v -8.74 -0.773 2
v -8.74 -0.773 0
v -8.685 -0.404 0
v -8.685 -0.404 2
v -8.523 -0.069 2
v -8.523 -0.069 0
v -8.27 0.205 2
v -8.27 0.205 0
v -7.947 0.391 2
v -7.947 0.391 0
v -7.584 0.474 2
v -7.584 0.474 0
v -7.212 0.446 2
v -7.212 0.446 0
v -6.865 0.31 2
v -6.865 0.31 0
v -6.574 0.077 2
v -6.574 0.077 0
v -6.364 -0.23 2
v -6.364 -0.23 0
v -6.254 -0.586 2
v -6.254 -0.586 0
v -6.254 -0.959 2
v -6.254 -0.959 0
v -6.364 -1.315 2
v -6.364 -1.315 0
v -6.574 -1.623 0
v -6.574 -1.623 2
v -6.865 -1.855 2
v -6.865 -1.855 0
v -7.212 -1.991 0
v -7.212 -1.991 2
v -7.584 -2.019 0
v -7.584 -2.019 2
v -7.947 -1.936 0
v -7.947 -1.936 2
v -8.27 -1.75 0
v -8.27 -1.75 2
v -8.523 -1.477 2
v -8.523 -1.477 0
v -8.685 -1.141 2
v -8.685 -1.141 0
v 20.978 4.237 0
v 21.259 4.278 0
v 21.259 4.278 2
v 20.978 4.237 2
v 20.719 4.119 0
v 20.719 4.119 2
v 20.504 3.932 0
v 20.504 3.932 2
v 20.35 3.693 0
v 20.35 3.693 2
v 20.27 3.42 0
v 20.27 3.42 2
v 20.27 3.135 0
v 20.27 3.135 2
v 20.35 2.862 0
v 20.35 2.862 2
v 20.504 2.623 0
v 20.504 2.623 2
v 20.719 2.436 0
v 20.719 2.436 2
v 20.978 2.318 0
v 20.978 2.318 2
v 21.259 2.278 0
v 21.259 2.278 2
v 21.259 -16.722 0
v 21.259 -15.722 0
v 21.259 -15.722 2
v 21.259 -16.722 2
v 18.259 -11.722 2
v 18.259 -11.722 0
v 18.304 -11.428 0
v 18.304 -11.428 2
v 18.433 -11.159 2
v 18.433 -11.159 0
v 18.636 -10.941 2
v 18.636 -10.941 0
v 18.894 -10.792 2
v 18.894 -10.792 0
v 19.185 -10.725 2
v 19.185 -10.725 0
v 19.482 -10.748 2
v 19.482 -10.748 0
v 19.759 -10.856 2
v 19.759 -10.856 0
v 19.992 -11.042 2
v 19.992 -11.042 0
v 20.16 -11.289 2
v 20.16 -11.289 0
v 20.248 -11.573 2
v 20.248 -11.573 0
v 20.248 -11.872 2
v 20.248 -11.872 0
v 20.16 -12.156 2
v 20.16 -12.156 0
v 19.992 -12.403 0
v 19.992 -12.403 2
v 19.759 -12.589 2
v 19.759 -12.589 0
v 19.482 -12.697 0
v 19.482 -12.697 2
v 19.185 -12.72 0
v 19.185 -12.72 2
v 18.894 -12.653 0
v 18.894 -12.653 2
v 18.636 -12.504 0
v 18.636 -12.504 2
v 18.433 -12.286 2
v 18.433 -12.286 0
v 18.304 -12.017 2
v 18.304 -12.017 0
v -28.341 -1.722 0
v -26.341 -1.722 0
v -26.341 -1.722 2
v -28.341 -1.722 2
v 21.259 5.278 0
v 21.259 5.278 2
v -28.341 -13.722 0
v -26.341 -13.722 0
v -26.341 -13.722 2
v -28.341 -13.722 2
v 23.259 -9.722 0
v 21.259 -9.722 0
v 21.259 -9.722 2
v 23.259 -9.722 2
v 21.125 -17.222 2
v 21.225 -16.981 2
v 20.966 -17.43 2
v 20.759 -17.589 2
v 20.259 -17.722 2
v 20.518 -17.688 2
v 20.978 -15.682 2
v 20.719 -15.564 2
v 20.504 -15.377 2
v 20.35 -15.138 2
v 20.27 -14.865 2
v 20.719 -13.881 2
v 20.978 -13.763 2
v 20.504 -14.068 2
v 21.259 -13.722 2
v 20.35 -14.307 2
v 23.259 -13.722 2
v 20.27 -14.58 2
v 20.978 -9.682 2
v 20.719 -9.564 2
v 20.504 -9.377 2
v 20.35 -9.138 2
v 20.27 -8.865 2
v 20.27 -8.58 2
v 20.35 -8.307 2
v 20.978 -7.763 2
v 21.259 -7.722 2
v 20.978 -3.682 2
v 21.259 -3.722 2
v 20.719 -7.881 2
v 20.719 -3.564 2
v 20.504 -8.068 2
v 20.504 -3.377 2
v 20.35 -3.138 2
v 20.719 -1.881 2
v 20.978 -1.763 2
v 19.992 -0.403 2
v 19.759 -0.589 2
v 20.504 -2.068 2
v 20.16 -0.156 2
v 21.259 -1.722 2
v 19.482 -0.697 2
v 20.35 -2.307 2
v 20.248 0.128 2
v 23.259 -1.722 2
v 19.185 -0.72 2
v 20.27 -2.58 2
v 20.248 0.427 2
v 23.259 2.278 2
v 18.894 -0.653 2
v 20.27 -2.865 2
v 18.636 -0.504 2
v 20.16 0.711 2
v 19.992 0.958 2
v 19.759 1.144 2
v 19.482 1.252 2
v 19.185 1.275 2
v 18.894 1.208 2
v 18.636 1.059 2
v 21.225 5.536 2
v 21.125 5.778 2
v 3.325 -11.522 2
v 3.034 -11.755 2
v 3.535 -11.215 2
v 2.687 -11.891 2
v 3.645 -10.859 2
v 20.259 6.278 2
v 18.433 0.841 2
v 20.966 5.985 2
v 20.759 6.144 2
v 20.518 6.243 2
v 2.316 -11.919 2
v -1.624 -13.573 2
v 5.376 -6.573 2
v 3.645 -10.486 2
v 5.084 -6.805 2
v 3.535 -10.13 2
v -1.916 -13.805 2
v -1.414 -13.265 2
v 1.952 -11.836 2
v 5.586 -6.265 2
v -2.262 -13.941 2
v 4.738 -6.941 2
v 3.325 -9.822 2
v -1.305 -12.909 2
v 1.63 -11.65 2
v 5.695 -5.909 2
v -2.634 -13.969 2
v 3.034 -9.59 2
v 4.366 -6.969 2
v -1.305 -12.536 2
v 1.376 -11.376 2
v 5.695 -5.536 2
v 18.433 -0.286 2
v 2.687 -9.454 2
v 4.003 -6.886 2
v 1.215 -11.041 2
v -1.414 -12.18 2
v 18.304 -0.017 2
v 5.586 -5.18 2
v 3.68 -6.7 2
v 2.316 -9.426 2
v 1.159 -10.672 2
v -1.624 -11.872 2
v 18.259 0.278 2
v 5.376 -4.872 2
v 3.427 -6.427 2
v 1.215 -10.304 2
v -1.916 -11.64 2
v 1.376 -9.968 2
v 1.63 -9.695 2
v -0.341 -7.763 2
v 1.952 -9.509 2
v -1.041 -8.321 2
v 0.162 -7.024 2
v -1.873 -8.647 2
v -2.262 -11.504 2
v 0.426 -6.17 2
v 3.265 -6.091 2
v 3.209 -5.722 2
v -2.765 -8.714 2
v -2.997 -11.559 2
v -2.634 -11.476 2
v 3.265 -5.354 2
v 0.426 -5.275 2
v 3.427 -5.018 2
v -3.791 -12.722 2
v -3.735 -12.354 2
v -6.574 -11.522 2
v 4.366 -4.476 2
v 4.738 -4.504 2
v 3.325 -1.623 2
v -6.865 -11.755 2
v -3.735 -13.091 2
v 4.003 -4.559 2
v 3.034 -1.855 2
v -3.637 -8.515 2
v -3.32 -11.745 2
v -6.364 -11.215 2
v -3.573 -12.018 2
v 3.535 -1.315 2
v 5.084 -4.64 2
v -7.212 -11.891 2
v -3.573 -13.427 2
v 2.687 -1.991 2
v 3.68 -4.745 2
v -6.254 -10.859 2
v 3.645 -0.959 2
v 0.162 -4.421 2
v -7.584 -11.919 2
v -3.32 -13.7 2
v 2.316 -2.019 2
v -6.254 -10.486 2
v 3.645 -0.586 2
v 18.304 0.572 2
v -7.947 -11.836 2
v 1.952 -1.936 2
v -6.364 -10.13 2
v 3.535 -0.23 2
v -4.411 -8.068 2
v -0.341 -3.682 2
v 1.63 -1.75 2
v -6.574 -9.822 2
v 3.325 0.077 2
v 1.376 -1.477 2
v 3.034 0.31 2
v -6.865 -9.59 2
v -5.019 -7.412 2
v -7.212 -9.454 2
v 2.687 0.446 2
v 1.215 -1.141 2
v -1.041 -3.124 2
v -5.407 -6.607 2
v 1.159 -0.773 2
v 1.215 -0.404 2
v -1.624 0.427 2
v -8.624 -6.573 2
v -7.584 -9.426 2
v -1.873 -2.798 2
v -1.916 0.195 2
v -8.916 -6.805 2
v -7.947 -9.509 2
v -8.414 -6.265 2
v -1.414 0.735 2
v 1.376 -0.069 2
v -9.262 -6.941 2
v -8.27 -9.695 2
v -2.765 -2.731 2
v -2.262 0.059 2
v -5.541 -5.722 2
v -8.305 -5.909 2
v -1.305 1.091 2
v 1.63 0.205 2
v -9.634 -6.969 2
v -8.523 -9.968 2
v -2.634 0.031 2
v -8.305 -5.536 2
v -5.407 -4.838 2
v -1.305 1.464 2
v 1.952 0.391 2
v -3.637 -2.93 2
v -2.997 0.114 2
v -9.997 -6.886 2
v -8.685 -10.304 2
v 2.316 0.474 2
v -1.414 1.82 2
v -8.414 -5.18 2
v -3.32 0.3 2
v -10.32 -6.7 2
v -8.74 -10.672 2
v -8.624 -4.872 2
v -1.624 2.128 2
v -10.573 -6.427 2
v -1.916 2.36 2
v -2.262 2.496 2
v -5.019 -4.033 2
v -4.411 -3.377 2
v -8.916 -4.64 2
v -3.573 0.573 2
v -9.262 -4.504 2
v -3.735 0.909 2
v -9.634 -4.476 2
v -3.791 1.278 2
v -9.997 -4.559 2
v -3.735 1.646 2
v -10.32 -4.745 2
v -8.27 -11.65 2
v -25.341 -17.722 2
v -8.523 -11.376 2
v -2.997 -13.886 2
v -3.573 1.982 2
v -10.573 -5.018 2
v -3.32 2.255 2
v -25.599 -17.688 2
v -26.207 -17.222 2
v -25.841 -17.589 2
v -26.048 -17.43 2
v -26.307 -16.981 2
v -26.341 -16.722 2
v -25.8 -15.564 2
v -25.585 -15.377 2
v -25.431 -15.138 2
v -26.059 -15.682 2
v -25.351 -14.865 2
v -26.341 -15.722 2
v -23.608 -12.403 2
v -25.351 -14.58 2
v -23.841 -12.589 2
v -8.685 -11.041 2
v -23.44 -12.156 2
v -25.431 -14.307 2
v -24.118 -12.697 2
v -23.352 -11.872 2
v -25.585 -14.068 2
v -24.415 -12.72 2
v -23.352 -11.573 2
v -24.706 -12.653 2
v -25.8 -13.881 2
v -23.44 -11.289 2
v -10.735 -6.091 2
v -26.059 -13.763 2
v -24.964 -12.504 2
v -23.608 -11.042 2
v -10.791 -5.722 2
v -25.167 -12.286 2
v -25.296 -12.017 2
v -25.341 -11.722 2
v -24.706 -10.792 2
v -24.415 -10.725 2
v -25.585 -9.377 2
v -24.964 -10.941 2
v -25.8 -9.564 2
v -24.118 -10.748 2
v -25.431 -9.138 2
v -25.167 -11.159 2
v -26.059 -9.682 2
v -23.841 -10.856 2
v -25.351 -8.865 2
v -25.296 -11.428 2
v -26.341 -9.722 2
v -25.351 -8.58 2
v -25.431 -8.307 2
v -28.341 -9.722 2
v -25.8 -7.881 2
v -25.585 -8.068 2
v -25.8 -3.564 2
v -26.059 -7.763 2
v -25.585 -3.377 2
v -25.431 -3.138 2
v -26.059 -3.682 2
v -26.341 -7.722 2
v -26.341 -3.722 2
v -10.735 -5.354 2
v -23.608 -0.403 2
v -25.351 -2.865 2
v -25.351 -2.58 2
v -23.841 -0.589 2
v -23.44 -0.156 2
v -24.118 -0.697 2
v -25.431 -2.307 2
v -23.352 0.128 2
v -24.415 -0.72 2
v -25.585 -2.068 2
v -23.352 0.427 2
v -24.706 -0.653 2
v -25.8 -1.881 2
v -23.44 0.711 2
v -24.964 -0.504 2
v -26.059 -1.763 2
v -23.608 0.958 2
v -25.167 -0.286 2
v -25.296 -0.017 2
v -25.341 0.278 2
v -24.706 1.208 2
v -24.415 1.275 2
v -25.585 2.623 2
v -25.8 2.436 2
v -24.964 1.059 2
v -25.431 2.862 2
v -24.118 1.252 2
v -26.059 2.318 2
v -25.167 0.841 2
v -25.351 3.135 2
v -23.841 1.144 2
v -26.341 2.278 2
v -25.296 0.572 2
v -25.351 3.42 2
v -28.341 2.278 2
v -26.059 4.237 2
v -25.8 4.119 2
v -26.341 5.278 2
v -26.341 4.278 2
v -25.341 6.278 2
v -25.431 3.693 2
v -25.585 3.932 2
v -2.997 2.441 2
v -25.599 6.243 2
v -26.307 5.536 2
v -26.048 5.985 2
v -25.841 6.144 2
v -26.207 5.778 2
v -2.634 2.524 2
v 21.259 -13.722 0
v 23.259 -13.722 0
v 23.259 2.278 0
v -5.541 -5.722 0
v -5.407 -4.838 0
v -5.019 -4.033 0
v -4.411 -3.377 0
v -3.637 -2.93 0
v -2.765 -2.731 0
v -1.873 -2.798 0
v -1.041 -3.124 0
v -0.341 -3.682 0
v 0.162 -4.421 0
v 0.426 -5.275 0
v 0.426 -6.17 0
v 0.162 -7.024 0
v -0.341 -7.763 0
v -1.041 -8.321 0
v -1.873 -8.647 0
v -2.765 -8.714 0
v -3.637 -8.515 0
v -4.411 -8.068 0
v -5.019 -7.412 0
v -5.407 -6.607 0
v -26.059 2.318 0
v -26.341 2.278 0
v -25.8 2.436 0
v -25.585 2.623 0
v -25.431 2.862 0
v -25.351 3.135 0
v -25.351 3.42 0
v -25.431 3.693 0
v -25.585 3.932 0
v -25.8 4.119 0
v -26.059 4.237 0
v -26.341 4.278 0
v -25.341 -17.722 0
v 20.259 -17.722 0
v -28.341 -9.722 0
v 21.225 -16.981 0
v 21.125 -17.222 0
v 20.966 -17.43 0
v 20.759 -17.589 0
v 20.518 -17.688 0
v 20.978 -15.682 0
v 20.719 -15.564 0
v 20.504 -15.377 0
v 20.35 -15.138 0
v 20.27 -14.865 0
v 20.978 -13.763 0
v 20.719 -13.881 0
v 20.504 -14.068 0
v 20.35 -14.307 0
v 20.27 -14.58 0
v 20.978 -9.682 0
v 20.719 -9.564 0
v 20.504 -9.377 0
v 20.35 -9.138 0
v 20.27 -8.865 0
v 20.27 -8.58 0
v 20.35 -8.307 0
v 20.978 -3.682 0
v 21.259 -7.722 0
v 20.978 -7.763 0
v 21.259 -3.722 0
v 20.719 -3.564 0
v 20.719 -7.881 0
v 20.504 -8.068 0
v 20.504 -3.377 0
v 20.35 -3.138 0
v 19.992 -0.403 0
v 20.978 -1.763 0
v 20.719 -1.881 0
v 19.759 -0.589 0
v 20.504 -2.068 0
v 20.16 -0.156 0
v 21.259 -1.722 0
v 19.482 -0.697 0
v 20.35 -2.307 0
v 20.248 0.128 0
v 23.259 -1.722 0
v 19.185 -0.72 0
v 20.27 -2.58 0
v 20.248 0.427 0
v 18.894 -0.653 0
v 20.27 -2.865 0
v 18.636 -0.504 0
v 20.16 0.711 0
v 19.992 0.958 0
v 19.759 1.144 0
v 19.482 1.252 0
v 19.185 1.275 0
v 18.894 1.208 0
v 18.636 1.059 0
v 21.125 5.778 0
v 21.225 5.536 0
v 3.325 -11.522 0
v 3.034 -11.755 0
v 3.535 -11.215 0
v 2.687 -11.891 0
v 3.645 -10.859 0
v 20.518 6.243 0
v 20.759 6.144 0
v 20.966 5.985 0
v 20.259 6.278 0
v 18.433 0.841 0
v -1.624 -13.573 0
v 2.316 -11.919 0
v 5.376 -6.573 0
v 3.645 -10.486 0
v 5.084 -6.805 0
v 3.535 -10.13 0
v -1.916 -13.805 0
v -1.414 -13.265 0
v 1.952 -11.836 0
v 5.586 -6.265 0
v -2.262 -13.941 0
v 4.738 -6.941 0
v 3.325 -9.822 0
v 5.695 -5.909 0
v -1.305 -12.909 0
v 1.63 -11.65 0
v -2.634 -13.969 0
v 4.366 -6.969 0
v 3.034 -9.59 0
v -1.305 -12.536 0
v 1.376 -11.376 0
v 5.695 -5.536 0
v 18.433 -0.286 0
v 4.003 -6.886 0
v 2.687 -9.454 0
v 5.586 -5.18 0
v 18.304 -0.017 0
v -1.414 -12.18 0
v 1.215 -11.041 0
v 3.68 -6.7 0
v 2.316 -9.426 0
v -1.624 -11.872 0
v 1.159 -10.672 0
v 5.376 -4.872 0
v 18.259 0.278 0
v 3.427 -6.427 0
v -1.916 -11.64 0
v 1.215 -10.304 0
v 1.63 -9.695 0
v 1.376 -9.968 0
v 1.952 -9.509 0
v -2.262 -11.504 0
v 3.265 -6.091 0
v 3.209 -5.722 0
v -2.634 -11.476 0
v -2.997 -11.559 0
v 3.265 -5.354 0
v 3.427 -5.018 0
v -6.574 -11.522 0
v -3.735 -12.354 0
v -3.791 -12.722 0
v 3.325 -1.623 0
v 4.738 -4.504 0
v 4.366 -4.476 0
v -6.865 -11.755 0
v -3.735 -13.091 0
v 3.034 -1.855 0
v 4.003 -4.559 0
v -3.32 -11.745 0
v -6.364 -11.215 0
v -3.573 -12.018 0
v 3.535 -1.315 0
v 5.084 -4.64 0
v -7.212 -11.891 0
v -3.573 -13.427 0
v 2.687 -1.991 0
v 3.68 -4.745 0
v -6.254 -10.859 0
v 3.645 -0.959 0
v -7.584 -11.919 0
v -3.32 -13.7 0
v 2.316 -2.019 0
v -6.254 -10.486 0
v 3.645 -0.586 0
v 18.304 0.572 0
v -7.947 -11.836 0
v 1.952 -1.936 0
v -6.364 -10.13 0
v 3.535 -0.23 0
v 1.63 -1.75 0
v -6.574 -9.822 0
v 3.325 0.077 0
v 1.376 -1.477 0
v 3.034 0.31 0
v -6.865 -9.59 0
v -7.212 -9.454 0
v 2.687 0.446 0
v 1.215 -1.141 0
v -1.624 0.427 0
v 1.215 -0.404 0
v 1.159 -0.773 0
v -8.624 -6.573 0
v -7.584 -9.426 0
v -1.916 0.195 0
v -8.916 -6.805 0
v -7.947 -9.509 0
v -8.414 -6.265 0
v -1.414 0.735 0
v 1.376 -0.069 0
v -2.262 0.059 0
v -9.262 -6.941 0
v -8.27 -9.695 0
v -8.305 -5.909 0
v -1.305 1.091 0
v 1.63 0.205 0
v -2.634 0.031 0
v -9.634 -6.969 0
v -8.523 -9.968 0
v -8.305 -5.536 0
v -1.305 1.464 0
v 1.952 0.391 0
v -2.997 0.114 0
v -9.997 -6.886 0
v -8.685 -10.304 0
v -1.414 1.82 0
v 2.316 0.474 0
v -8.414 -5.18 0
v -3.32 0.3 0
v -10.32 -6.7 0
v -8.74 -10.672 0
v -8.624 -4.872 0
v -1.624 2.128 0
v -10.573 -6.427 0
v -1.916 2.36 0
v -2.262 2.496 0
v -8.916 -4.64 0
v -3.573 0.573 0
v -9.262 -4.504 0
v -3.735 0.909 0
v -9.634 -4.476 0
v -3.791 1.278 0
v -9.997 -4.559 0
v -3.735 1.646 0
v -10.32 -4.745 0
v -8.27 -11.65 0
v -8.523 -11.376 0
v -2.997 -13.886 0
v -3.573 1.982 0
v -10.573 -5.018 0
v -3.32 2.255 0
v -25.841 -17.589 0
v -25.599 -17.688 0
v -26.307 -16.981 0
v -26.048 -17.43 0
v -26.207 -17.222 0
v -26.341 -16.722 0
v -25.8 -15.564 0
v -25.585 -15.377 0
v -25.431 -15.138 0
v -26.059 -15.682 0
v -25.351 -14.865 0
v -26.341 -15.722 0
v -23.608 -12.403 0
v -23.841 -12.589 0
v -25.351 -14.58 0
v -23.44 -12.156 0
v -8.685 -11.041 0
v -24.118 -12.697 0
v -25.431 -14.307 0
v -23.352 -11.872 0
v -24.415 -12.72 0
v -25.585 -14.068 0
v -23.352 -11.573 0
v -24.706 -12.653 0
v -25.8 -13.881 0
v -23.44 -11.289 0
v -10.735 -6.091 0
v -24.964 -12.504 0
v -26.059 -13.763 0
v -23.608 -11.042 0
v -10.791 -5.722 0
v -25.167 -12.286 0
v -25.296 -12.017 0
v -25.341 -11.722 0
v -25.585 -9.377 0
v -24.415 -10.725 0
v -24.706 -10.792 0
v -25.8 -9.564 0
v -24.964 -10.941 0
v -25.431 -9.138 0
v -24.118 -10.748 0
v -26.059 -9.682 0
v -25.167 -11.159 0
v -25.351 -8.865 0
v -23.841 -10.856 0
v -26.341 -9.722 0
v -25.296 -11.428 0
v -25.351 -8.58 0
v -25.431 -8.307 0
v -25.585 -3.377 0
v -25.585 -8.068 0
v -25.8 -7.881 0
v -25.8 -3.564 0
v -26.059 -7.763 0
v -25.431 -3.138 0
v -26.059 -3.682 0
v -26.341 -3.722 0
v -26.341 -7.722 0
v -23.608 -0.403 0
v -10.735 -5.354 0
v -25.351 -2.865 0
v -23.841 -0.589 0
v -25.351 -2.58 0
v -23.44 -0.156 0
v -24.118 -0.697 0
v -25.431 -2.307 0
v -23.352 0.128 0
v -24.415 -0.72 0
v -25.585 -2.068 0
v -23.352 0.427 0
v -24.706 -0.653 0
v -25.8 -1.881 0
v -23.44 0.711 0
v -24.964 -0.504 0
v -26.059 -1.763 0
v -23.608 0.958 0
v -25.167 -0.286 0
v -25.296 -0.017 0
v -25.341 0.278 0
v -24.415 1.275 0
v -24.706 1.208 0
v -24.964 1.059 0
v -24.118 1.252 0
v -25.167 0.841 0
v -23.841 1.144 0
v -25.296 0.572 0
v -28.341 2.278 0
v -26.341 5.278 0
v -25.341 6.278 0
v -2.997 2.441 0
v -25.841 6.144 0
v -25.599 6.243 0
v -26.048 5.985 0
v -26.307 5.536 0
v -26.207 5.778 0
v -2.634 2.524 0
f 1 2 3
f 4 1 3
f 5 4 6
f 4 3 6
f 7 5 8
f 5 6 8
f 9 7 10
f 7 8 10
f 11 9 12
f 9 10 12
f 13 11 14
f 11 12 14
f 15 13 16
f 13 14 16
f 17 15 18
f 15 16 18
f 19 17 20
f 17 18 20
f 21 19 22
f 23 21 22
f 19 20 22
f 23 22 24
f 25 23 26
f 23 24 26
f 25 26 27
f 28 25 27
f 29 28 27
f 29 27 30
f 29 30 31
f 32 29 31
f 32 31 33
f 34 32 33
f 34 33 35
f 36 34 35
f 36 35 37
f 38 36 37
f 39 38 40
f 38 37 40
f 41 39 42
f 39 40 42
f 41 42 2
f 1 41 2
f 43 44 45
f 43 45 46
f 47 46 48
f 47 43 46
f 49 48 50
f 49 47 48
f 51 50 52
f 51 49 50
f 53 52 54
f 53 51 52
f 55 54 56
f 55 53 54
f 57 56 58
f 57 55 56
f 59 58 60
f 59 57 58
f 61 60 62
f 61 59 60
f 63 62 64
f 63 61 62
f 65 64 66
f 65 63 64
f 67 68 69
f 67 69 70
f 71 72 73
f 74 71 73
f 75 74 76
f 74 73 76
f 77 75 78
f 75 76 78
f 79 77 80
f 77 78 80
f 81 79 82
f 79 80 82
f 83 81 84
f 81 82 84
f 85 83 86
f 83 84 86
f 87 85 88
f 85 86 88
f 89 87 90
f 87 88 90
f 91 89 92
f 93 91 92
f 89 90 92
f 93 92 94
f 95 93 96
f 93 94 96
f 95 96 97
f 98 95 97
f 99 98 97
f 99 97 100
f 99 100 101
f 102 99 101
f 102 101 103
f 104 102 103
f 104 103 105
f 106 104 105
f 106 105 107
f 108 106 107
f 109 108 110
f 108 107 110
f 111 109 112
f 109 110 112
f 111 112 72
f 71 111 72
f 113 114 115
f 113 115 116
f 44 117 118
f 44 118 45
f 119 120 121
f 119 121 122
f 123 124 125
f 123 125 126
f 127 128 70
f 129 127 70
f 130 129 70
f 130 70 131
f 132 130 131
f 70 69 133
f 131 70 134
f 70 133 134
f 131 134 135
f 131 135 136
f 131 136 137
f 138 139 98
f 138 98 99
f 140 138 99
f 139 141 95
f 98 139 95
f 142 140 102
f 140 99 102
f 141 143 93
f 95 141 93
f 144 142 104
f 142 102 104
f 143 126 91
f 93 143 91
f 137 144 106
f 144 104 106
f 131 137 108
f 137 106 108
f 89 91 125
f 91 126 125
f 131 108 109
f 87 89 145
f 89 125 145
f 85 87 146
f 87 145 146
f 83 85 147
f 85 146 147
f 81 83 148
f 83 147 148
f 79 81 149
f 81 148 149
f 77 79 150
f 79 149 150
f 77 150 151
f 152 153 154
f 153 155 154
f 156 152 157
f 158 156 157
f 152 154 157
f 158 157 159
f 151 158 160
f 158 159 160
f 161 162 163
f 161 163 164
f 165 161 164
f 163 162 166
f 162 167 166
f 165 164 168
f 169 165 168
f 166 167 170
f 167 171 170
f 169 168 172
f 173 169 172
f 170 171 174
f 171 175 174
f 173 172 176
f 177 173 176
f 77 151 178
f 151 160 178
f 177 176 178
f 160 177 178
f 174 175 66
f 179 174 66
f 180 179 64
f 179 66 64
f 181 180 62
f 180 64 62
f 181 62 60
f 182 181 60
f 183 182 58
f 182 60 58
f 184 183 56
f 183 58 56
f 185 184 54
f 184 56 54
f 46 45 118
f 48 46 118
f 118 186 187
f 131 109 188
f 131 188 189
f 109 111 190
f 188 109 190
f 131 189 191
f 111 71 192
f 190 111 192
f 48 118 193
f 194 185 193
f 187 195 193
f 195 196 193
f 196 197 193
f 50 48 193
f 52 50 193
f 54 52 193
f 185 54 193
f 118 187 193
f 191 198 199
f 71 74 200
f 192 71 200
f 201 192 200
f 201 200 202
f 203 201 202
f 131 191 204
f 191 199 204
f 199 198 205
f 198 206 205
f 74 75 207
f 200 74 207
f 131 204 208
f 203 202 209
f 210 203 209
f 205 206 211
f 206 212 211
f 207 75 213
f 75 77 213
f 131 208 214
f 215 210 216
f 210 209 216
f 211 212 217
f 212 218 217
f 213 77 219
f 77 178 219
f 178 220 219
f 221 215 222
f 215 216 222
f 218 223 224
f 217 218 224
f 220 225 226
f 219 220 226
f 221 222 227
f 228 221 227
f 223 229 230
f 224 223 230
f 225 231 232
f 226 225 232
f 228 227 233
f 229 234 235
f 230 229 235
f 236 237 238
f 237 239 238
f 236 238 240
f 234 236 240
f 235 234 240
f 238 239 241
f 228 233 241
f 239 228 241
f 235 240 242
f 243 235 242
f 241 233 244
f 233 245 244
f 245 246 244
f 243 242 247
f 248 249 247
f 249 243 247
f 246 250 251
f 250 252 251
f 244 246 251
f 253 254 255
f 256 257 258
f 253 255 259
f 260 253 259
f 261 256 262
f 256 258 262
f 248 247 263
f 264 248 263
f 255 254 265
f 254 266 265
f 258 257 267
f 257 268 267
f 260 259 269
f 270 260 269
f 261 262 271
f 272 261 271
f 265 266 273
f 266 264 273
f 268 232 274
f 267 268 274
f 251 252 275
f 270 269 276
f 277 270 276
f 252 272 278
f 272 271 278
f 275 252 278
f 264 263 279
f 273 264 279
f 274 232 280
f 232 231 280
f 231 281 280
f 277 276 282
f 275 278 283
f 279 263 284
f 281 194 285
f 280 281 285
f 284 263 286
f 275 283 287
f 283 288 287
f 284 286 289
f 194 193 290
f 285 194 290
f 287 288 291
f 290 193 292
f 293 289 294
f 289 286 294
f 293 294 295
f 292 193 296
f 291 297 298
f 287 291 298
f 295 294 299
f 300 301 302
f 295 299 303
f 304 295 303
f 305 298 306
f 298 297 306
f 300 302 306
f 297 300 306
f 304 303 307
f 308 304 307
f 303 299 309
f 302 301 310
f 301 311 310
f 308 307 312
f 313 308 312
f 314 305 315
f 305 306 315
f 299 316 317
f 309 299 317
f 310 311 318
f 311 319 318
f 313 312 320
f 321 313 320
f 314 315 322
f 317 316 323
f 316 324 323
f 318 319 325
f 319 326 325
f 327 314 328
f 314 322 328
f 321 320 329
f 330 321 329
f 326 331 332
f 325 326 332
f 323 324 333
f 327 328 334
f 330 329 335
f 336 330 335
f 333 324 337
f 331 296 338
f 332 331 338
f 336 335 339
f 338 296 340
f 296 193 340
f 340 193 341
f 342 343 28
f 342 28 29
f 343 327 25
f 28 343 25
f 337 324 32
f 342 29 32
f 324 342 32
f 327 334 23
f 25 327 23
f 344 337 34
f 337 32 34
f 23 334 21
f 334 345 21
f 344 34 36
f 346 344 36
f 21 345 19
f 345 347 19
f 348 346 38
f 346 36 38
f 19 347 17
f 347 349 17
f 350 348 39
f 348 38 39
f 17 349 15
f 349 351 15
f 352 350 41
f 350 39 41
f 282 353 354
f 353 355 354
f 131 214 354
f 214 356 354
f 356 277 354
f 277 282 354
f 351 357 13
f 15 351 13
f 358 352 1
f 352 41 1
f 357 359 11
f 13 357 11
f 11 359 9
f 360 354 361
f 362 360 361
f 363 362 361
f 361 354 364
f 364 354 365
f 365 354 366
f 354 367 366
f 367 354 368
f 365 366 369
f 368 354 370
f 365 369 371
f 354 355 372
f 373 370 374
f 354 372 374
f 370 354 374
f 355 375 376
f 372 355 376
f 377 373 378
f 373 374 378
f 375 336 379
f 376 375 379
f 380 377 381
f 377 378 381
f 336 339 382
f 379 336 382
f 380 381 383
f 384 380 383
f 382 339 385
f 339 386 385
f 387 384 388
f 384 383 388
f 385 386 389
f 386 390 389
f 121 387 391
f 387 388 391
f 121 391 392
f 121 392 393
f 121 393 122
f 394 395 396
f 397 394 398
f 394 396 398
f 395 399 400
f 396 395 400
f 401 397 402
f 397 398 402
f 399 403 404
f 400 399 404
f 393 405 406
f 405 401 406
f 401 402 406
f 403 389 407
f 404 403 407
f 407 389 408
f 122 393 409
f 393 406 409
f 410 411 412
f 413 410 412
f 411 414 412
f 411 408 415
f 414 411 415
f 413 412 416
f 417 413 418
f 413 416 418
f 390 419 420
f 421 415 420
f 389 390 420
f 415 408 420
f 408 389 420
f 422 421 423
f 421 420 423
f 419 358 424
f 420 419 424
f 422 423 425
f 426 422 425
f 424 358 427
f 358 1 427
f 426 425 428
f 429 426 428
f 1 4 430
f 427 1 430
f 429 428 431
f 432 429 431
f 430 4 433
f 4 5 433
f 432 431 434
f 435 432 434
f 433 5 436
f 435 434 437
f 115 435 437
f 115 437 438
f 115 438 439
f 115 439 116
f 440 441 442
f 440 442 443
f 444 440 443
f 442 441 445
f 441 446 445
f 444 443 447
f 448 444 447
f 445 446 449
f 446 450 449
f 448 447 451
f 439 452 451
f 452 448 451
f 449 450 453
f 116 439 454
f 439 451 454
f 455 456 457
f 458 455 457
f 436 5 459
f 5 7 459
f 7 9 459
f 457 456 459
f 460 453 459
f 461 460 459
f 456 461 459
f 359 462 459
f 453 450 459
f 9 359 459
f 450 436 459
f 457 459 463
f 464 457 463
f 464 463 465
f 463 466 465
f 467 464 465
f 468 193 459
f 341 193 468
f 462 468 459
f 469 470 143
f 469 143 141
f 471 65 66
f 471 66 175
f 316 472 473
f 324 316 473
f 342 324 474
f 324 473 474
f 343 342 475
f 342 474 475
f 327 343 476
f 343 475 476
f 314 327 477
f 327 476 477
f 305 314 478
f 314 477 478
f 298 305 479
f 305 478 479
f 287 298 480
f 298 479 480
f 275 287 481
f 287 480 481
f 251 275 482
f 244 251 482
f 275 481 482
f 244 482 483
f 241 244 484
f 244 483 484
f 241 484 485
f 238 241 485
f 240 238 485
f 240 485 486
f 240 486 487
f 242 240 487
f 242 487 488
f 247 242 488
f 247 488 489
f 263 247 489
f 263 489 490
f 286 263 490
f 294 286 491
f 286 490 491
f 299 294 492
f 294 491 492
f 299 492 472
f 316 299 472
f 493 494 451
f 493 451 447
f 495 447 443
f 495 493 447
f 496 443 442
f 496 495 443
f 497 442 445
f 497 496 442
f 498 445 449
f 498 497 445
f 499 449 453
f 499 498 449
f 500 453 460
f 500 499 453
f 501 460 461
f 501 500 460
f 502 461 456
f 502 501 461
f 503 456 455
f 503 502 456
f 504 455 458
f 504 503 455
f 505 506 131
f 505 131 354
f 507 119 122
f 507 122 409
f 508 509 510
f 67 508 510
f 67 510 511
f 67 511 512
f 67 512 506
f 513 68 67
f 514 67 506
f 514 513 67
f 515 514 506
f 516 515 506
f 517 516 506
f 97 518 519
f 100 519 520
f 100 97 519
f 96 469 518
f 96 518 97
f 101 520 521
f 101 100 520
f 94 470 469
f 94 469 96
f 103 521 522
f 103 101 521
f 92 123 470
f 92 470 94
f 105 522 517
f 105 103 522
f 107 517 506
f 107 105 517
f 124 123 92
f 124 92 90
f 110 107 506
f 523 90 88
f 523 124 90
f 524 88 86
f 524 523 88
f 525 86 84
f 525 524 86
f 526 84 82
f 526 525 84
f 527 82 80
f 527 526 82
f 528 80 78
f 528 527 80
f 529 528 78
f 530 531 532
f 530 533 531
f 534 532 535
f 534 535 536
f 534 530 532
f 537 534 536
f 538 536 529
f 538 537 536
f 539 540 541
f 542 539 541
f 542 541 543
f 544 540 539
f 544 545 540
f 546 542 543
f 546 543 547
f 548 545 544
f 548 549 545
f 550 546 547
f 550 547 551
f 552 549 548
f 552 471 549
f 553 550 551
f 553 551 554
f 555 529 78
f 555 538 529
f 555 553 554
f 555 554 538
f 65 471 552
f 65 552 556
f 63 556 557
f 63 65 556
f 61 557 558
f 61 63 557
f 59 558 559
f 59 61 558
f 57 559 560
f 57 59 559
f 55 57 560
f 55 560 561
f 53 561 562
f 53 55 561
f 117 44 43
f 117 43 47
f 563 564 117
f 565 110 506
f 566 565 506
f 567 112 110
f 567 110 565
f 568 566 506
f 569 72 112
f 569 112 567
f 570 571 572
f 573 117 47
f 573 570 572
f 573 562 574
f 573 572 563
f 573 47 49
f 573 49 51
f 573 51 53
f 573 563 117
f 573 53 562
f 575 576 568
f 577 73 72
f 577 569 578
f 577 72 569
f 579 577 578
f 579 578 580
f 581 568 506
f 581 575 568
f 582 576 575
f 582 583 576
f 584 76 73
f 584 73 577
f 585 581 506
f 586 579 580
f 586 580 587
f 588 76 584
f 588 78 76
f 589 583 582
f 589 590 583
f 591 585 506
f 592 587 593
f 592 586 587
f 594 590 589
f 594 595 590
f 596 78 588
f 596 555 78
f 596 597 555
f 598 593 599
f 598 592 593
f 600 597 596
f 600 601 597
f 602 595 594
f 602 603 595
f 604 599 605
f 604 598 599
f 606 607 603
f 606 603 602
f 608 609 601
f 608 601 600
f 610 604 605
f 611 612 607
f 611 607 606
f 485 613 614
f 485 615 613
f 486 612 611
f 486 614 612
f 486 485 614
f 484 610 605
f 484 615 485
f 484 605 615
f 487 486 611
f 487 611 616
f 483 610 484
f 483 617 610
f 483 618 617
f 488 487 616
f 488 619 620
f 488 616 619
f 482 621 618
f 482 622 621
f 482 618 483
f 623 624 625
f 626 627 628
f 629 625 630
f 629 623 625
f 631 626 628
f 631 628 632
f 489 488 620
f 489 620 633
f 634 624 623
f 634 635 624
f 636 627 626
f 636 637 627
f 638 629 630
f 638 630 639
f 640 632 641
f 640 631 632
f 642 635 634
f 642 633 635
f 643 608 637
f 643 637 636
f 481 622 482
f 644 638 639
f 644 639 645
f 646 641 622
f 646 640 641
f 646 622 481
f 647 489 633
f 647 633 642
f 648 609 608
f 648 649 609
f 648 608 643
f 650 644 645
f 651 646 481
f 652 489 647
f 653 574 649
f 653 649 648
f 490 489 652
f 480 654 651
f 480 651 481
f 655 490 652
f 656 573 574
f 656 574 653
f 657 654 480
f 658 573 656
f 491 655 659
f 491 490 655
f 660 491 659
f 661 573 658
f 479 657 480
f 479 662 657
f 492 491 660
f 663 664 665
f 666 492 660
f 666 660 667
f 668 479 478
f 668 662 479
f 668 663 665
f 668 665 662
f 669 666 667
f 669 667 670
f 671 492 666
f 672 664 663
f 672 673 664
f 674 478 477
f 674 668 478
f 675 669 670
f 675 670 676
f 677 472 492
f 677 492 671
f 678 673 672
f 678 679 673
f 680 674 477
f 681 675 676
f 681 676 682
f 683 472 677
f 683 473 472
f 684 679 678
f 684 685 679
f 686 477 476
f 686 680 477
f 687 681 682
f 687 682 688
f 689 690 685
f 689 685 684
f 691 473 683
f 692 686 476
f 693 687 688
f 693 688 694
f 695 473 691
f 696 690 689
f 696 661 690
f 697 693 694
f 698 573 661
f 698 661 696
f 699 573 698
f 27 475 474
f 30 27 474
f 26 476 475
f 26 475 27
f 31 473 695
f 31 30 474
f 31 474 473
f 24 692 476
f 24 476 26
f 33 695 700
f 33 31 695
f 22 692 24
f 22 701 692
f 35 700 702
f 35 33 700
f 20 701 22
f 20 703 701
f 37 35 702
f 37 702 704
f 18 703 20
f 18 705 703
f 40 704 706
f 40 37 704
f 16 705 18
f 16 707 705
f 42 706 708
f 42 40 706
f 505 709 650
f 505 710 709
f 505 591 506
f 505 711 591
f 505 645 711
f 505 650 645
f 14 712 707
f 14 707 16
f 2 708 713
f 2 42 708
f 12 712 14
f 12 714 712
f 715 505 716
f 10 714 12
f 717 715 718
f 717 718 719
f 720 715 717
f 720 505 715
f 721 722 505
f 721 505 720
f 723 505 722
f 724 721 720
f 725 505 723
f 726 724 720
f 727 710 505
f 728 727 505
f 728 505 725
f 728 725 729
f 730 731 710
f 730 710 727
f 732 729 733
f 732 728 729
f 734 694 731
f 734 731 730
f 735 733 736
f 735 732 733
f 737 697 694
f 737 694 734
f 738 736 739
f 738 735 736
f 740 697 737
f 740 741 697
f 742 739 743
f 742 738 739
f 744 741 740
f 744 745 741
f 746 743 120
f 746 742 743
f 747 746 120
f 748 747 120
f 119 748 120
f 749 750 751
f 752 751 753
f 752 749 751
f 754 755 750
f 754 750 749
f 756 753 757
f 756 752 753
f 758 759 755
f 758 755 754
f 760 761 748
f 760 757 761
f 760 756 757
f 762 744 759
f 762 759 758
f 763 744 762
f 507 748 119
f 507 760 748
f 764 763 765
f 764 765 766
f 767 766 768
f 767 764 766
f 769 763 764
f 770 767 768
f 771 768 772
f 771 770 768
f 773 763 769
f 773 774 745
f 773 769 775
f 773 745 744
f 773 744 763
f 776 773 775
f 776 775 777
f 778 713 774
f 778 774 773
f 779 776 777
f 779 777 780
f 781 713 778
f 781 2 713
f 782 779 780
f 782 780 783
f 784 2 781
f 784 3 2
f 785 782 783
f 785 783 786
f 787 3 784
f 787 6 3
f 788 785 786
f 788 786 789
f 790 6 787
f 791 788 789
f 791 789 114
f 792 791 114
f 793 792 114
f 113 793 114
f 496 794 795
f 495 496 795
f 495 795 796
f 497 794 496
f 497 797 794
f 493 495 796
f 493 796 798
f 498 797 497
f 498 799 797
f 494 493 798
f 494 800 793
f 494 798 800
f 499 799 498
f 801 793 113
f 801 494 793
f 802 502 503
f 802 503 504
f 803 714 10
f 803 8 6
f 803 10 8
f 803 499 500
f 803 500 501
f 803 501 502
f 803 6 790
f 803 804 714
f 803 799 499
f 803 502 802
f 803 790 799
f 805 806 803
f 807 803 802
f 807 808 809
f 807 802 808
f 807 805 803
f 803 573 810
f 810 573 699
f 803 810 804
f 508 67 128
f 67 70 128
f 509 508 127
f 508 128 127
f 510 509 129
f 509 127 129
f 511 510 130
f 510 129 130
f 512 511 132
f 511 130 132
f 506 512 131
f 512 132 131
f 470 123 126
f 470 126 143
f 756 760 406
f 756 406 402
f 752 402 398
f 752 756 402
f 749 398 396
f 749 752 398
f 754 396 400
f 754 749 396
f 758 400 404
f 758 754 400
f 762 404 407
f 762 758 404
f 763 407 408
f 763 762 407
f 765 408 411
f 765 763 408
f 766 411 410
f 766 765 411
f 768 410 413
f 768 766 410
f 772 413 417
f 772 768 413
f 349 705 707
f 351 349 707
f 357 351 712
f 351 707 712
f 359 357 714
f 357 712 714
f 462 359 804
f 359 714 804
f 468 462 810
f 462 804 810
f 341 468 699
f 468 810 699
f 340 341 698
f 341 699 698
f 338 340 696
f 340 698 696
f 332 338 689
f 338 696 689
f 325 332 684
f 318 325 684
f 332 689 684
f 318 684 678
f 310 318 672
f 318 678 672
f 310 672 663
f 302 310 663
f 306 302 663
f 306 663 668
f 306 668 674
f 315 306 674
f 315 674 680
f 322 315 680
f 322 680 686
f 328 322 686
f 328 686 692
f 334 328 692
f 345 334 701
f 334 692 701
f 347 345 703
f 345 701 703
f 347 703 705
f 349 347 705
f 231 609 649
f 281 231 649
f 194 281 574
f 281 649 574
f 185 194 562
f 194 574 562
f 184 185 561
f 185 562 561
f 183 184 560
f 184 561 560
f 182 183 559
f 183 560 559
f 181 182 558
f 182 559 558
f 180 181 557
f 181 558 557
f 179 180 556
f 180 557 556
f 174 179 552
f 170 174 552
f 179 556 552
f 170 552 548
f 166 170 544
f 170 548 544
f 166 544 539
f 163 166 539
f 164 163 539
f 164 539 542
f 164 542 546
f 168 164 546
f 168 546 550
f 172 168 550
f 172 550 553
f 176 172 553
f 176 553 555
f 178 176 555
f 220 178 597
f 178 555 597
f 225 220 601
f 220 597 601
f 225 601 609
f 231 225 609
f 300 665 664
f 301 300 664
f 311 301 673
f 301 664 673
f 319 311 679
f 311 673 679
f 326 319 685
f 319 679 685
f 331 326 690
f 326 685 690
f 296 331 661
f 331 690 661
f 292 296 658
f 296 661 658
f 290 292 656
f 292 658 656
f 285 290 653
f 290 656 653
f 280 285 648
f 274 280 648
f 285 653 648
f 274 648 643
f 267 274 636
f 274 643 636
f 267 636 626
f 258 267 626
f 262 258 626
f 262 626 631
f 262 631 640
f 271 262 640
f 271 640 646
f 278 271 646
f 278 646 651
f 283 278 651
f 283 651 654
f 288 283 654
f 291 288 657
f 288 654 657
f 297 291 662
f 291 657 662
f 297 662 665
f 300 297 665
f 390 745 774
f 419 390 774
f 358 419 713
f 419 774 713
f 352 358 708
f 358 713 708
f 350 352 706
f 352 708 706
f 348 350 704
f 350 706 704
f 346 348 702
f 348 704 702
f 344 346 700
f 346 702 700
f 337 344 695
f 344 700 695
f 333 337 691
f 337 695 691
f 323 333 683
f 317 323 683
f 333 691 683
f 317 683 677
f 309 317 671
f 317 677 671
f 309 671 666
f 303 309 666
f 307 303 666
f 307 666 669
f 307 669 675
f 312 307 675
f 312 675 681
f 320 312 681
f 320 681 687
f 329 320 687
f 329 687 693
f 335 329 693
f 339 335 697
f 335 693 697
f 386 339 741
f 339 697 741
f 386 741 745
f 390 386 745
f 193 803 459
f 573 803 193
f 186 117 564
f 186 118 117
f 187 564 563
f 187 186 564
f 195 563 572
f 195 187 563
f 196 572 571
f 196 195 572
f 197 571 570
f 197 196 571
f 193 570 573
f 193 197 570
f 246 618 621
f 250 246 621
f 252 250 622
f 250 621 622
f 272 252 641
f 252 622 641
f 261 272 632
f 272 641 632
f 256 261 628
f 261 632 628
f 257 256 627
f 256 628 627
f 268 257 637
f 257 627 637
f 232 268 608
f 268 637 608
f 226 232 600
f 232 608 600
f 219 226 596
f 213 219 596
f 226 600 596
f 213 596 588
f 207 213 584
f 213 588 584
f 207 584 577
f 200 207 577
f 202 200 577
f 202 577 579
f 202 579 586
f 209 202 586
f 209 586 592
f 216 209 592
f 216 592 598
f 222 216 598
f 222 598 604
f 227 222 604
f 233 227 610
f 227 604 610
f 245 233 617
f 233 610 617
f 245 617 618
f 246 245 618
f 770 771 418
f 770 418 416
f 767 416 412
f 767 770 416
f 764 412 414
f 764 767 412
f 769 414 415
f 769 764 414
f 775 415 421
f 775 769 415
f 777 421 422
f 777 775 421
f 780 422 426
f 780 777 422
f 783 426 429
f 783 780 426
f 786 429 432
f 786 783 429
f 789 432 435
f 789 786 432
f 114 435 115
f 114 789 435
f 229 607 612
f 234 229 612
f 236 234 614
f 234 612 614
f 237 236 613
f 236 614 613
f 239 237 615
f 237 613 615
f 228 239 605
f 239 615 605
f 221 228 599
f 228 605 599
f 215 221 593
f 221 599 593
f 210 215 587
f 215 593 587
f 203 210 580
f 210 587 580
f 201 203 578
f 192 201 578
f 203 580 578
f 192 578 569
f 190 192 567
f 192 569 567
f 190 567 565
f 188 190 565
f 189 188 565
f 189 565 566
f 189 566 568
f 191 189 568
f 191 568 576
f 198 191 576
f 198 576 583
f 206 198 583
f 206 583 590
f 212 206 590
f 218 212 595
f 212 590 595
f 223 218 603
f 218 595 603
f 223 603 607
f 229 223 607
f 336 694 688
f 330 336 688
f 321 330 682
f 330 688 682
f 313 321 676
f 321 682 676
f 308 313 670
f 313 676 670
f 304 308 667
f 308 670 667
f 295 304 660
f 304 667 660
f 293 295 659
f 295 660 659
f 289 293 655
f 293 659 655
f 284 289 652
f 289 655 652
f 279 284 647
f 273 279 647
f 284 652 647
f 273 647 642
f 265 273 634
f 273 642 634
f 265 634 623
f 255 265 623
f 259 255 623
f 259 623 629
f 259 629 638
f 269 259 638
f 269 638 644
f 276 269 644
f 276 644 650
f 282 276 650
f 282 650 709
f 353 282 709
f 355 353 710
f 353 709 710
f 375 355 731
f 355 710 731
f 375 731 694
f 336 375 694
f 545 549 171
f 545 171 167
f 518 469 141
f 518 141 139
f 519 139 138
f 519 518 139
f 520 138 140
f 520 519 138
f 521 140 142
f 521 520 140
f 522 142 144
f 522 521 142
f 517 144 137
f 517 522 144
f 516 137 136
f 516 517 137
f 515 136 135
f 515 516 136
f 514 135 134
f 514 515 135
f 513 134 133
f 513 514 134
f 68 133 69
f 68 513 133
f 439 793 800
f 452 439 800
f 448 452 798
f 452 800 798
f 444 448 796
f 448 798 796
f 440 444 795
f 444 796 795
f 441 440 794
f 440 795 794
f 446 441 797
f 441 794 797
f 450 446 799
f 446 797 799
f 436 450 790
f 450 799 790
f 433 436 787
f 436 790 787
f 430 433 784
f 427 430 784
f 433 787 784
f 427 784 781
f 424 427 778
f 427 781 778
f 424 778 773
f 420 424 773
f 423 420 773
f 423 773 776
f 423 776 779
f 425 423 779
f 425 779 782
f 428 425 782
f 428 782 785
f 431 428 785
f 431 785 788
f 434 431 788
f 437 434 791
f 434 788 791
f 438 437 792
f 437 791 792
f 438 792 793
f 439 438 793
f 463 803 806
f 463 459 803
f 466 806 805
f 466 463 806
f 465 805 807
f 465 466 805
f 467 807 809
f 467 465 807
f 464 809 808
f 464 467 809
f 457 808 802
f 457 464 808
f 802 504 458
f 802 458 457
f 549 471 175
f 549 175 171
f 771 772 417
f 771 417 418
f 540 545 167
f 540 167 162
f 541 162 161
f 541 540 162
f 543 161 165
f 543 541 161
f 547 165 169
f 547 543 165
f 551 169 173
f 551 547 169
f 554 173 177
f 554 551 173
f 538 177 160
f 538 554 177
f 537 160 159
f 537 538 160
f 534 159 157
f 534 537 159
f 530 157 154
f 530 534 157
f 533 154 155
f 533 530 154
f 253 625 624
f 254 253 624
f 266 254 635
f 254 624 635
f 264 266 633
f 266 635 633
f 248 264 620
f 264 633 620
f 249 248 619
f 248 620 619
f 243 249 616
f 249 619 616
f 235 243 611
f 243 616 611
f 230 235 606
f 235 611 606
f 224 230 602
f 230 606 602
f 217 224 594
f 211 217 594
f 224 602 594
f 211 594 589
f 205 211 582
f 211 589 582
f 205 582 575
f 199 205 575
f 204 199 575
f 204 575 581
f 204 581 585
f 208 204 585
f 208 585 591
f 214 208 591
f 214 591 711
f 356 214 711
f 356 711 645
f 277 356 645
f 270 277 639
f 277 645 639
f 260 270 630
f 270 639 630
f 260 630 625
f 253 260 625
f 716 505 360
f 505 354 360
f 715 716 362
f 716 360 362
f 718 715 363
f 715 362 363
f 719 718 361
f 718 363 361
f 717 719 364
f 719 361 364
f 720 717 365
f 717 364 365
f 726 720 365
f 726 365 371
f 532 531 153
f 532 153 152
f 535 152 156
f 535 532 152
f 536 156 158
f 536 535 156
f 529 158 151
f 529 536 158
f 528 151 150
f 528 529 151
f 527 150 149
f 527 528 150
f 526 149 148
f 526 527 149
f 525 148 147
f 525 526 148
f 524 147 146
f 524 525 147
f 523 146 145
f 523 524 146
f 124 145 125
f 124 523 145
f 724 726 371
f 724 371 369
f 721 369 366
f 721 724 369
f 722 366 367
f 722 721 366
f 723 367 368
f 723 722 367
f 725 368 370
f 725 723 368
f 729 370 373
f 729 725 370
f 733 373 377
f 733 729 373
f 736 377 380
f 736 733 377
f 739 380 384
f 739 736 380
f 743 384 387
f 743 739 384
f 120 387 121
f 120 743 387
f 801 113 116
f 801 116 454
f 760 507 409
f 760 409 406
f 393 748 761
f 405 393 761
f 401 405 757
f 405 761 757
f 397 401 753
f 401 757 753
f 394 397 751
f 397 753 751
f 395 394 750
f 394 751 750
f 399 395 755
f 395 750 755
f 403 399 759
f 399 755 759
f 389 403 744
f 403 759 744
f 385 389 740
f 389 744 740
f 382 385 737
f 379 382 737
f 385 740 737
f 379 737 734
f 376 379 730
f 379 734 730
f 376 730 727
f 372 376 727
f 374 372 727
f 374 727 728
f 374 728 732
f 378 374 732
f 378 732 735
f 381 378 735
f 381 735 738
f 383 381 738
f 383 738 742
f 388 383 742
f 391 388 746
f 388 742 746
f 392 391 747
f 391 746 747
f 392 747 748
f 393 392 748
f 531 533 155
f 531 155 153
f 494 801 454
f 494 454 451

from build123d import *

# Parameters (mm, degrees)
SKETCH_1_R          = 1
EXTRUDE_2_DEPTH     = 2
SKETCH_3_R          = 1
CUT_EXTRUDE_1_DEPTH = 2
SKETCH_4_R          = 1
EXTRUDE_4_DEPTH     = 2
SKETCH_5_R          = 3
SKETCH_5_R_2        = 1.25
CUT_EXTRUDE_2_DEPTH = 2
EXTRUDE_START       = -2
SKETCH_6_R          = 1
EXTRUDE_6_DEPTH     = 2
SKETCH_7_R          = 1
CUT_EXTRUDE_3_DEPTH = 2
FILLET_3_R          = 1
FILLET_4_R          = 1
FILLET_5_R          = 1


with BuildPart() as part:
    # 草圖1 → 填料-伸長2 (new body)
    with BuildSketch(Plane.XY):
        with BuildLine():
            Line((21.259390326, 6.277522936), (21.259390326, 4.277522936))
            ThreePointArc((21.259390326, 4.277522936), (20.259390326, 3.277522936), (21.259390326, 2.277522936))
            Line((21.259390326, 2.277522936), (23.259390326, 2.277522936))
            Line((23.259390326, 2.277522936), (23.259390326, -1.722477064))
            Line((23.259390326, -1.722477064), (21.259390326, -1.722477064))
            ThreePointArc((21.259390326, -1.722477064), (20.259390326, -2.722477064), (21.259390326, -3.722477064))
            Line((21.259390326, -3.722477064), (21.259390326, -7.722477064))
            ThreePointArc((21.259390326, -7.722477064), (20.259390326, -8.722477064), (21.259390326, -9.722477064))
            Line((21.259390326, -9.722477064), (23.259390326, -9.722477064))
            Line((23.259390326, -9.722477064), (23.259390326, -13.722477064))
            Line((23.259390326, -13.722477064), (21.259390326, -13.722477064))
            ThreePointArc((21.259390326, -13.722477064), (20.259390326, -14.722477064), (21.259390326, -15.722477064))
            Line((21.259390326, -15.722477064), (21.259390326, -17.722477064))
            Line((21.259390326, -17.722477064), (-26.340609674, -17.722477064))
            Line((-26.340609674, -17.722477064), (-26.340609674, -15.722477064))
            ThreePointArc((-26.340609674, -15.722477064), (-25.340609674, -14.722477064), (-26.340609674, -13.722477064))
            Line((-26.340609674, -13.722477064), (-28.340609674, -13.722477064))
            Line((-28.340609674, -13.722477064), (-28.340609674, -9.722477064))
            Line((-28.340609674, -9.722477064), (-26.340609674, -9.722477064))
            ThreePointArc((-26.340609674, -9.722477064), (-25.340609674, -8.722477064), (-26.340609674, -7.722477064))
            Line((-26.340609674, -7.722477064), (-26.340609674, -3.722477064))
            ThreePointArc((-26.340609674, -3.722477064), (-25.340609674, -2.722477064), (-26.340609674, -1.722477064))
            Line((-26.340609674, -1.722477064), (-28.340609674, -1.722477064))
            Line((-28.340609674, -1.722477064), (-28.340609674, 2.277522936))
            Line((-28.340609674, 2.277522936), (-26.340609674, 2.277522936))
            ThreePointArc((-26.340609674, 2.277522936), (-25.340609674, 3.277522936), (-26.340609674, 4.277522936))
            Line((-26.340609674, 4.277522936), (-26.340609674, 6.277522936))
            Line((-26.340609674, 6.277522936), (21.259390326, 6.277522936))
        make_face()
        with Locations((-20.540609674, -5.722477064)):
            Circle(SKETCH_1_R, mode=Mode.SUBTRACT)
        with Locations(Location((15.459390326, -5.722477064, 0), (0, 0, 180))):
            Circle(SKETCH_1_R, mode=Mode.SUBTRACT)
    extrude(amount=EXTRUDE_2_DEPTH)

    # 草圖3 → 除料-伸長1 (cut)
    with BuildSketch(Plane.XY.offset(2)):
        with Locations((19.259390326, -5.722477064)):
            Circle(SKETCH_3_R)
        with Locations(Location((-24.340609674, -3.722477064, 0), (0, 0, 180))):
            Circle(SKETCH_3_R)
    extrude(amount=-CUT_EXTRUDE_1_DEPTH, mode=Mode.SUBTRACT)

    # 草圖4 → 填料-伸長4 (add)
    with BuildSketch(Plane(origin=(0, 0, 0), x_dir=(-1, 0, 0), z_dir=(0, 0, -1))):
        with Locations((-15.459390326, -5.722477064)):
            Circle(SKETCH_4_R)
        with Locations((20.540609674, -5.722477064)):
            Circle(SKETCH_4_R)
    extrude(amount=-EXTRUDE_4_DEPTH)

    # 草圖5 → 除料-伸長2 (cut)
    with BuildSketch(Plane(origin=(0, 0, 0), x_dir=(-1, 0, 0), z_dir=(0, 0, -1))):
        with Locations((2.540609674, -5.722477064)):
            Circle(SKETCH_5_R)
        with Locations((2.540609674, 1.277522936)):
            Circle(SKETCH_5_R_2)
        with Locations((7.490357142, -0.772729596)):
            Circle(SKETCH_5_R_2)
        with Locations((9.540609674, -5.722477064)):
            Circle(SKETCH_5_R_2)
        with Locations((7.490357142, -10.672224533)):
            Circle(SKETCH_5_R_2)
        with Locations((2.540609674, -12.722477064)):
            Circle(SKETCH_5_R_2)
        with Locations((-2.409137794, -10.672224533)):
            Circle(SKETCH_5_R_2)
        with Locations((-4.459390326, -5.722477064)):
            Circle(SKETCH_5_R_2)
        with Locations((-2.409137794, -0.772729596)):
            Circle(SKETCH_5_R_2)
    extrude(amount=-CUT_EXTRUDE_2_DEPTH, mode=Mode.SUBTRACT)

    # 草圖6 → 填料-伸長6 (add)
    with BuildSketch(Plane(origin=(0, 0, 0), x_dir=(-1, 0, 0), z_dir=(0, 0, -1)).offset(EXTRUDE_START)):
        with Locations((-19.259390326, -5.722477064)):
            Circle(SKETCH_6_R)
        with Locations((24.340609674, -3.722477064)):
            Circle(SKETCH_6_R)
    extrude(amount=EXTRUDE_6_DEPTH)

    # 草圖7 → 除料-伸長3 (cut)
    with BuildSketch(Plane(origin=(0, 0, 0), x_dir=(-1, 0, 0), z_dir=(0, 0, -1))):
        with Locations((-19.259390326, 0.277522936)):
            Circle(SKETCH_7_R)
        with Locations((-19.259390326, -11.722477064)):
            Circle(SKETCH_7_R)
        with Locations((24.340609674, -11.722477064)):
            Circle(SKETCH_7_R)
        with Locations((24.340609674, 0.277522936)):
            Circle(SKETCH_7_R)
    extrude(amount=-CUT_EXTRUDE_3_DEPTH, mode=Mode.SUBTRACT)

    # 圓角3
    fillet_3_edges = [part.edges().sort_by_distance(p)[0] for p in [
        (21.259390326, 6.277522936, 1),
    ]]
    fillet(fillet_3_edges, radius=FILLET_3_R)

    # 圓角4
    fillet_4_edges = [part.edges().sort_by_distance(p)[0] for p in [
        (21.259390326, -17.722477064, 1),
    ]]
    fillet(fillet_4_edges, radius=FILLET_4_R)

    # 圓角5
    fillet_5_edges = [part.edges().sort_by_distance(p)[0] for p in [
        (-26.340609674, 6.277522936, 1),
        (-26.340609674, -17.722477064, 1),
    ]]
    fillet(fillet_5_edges, radius=FILLET_5_R)


solid = part.part
